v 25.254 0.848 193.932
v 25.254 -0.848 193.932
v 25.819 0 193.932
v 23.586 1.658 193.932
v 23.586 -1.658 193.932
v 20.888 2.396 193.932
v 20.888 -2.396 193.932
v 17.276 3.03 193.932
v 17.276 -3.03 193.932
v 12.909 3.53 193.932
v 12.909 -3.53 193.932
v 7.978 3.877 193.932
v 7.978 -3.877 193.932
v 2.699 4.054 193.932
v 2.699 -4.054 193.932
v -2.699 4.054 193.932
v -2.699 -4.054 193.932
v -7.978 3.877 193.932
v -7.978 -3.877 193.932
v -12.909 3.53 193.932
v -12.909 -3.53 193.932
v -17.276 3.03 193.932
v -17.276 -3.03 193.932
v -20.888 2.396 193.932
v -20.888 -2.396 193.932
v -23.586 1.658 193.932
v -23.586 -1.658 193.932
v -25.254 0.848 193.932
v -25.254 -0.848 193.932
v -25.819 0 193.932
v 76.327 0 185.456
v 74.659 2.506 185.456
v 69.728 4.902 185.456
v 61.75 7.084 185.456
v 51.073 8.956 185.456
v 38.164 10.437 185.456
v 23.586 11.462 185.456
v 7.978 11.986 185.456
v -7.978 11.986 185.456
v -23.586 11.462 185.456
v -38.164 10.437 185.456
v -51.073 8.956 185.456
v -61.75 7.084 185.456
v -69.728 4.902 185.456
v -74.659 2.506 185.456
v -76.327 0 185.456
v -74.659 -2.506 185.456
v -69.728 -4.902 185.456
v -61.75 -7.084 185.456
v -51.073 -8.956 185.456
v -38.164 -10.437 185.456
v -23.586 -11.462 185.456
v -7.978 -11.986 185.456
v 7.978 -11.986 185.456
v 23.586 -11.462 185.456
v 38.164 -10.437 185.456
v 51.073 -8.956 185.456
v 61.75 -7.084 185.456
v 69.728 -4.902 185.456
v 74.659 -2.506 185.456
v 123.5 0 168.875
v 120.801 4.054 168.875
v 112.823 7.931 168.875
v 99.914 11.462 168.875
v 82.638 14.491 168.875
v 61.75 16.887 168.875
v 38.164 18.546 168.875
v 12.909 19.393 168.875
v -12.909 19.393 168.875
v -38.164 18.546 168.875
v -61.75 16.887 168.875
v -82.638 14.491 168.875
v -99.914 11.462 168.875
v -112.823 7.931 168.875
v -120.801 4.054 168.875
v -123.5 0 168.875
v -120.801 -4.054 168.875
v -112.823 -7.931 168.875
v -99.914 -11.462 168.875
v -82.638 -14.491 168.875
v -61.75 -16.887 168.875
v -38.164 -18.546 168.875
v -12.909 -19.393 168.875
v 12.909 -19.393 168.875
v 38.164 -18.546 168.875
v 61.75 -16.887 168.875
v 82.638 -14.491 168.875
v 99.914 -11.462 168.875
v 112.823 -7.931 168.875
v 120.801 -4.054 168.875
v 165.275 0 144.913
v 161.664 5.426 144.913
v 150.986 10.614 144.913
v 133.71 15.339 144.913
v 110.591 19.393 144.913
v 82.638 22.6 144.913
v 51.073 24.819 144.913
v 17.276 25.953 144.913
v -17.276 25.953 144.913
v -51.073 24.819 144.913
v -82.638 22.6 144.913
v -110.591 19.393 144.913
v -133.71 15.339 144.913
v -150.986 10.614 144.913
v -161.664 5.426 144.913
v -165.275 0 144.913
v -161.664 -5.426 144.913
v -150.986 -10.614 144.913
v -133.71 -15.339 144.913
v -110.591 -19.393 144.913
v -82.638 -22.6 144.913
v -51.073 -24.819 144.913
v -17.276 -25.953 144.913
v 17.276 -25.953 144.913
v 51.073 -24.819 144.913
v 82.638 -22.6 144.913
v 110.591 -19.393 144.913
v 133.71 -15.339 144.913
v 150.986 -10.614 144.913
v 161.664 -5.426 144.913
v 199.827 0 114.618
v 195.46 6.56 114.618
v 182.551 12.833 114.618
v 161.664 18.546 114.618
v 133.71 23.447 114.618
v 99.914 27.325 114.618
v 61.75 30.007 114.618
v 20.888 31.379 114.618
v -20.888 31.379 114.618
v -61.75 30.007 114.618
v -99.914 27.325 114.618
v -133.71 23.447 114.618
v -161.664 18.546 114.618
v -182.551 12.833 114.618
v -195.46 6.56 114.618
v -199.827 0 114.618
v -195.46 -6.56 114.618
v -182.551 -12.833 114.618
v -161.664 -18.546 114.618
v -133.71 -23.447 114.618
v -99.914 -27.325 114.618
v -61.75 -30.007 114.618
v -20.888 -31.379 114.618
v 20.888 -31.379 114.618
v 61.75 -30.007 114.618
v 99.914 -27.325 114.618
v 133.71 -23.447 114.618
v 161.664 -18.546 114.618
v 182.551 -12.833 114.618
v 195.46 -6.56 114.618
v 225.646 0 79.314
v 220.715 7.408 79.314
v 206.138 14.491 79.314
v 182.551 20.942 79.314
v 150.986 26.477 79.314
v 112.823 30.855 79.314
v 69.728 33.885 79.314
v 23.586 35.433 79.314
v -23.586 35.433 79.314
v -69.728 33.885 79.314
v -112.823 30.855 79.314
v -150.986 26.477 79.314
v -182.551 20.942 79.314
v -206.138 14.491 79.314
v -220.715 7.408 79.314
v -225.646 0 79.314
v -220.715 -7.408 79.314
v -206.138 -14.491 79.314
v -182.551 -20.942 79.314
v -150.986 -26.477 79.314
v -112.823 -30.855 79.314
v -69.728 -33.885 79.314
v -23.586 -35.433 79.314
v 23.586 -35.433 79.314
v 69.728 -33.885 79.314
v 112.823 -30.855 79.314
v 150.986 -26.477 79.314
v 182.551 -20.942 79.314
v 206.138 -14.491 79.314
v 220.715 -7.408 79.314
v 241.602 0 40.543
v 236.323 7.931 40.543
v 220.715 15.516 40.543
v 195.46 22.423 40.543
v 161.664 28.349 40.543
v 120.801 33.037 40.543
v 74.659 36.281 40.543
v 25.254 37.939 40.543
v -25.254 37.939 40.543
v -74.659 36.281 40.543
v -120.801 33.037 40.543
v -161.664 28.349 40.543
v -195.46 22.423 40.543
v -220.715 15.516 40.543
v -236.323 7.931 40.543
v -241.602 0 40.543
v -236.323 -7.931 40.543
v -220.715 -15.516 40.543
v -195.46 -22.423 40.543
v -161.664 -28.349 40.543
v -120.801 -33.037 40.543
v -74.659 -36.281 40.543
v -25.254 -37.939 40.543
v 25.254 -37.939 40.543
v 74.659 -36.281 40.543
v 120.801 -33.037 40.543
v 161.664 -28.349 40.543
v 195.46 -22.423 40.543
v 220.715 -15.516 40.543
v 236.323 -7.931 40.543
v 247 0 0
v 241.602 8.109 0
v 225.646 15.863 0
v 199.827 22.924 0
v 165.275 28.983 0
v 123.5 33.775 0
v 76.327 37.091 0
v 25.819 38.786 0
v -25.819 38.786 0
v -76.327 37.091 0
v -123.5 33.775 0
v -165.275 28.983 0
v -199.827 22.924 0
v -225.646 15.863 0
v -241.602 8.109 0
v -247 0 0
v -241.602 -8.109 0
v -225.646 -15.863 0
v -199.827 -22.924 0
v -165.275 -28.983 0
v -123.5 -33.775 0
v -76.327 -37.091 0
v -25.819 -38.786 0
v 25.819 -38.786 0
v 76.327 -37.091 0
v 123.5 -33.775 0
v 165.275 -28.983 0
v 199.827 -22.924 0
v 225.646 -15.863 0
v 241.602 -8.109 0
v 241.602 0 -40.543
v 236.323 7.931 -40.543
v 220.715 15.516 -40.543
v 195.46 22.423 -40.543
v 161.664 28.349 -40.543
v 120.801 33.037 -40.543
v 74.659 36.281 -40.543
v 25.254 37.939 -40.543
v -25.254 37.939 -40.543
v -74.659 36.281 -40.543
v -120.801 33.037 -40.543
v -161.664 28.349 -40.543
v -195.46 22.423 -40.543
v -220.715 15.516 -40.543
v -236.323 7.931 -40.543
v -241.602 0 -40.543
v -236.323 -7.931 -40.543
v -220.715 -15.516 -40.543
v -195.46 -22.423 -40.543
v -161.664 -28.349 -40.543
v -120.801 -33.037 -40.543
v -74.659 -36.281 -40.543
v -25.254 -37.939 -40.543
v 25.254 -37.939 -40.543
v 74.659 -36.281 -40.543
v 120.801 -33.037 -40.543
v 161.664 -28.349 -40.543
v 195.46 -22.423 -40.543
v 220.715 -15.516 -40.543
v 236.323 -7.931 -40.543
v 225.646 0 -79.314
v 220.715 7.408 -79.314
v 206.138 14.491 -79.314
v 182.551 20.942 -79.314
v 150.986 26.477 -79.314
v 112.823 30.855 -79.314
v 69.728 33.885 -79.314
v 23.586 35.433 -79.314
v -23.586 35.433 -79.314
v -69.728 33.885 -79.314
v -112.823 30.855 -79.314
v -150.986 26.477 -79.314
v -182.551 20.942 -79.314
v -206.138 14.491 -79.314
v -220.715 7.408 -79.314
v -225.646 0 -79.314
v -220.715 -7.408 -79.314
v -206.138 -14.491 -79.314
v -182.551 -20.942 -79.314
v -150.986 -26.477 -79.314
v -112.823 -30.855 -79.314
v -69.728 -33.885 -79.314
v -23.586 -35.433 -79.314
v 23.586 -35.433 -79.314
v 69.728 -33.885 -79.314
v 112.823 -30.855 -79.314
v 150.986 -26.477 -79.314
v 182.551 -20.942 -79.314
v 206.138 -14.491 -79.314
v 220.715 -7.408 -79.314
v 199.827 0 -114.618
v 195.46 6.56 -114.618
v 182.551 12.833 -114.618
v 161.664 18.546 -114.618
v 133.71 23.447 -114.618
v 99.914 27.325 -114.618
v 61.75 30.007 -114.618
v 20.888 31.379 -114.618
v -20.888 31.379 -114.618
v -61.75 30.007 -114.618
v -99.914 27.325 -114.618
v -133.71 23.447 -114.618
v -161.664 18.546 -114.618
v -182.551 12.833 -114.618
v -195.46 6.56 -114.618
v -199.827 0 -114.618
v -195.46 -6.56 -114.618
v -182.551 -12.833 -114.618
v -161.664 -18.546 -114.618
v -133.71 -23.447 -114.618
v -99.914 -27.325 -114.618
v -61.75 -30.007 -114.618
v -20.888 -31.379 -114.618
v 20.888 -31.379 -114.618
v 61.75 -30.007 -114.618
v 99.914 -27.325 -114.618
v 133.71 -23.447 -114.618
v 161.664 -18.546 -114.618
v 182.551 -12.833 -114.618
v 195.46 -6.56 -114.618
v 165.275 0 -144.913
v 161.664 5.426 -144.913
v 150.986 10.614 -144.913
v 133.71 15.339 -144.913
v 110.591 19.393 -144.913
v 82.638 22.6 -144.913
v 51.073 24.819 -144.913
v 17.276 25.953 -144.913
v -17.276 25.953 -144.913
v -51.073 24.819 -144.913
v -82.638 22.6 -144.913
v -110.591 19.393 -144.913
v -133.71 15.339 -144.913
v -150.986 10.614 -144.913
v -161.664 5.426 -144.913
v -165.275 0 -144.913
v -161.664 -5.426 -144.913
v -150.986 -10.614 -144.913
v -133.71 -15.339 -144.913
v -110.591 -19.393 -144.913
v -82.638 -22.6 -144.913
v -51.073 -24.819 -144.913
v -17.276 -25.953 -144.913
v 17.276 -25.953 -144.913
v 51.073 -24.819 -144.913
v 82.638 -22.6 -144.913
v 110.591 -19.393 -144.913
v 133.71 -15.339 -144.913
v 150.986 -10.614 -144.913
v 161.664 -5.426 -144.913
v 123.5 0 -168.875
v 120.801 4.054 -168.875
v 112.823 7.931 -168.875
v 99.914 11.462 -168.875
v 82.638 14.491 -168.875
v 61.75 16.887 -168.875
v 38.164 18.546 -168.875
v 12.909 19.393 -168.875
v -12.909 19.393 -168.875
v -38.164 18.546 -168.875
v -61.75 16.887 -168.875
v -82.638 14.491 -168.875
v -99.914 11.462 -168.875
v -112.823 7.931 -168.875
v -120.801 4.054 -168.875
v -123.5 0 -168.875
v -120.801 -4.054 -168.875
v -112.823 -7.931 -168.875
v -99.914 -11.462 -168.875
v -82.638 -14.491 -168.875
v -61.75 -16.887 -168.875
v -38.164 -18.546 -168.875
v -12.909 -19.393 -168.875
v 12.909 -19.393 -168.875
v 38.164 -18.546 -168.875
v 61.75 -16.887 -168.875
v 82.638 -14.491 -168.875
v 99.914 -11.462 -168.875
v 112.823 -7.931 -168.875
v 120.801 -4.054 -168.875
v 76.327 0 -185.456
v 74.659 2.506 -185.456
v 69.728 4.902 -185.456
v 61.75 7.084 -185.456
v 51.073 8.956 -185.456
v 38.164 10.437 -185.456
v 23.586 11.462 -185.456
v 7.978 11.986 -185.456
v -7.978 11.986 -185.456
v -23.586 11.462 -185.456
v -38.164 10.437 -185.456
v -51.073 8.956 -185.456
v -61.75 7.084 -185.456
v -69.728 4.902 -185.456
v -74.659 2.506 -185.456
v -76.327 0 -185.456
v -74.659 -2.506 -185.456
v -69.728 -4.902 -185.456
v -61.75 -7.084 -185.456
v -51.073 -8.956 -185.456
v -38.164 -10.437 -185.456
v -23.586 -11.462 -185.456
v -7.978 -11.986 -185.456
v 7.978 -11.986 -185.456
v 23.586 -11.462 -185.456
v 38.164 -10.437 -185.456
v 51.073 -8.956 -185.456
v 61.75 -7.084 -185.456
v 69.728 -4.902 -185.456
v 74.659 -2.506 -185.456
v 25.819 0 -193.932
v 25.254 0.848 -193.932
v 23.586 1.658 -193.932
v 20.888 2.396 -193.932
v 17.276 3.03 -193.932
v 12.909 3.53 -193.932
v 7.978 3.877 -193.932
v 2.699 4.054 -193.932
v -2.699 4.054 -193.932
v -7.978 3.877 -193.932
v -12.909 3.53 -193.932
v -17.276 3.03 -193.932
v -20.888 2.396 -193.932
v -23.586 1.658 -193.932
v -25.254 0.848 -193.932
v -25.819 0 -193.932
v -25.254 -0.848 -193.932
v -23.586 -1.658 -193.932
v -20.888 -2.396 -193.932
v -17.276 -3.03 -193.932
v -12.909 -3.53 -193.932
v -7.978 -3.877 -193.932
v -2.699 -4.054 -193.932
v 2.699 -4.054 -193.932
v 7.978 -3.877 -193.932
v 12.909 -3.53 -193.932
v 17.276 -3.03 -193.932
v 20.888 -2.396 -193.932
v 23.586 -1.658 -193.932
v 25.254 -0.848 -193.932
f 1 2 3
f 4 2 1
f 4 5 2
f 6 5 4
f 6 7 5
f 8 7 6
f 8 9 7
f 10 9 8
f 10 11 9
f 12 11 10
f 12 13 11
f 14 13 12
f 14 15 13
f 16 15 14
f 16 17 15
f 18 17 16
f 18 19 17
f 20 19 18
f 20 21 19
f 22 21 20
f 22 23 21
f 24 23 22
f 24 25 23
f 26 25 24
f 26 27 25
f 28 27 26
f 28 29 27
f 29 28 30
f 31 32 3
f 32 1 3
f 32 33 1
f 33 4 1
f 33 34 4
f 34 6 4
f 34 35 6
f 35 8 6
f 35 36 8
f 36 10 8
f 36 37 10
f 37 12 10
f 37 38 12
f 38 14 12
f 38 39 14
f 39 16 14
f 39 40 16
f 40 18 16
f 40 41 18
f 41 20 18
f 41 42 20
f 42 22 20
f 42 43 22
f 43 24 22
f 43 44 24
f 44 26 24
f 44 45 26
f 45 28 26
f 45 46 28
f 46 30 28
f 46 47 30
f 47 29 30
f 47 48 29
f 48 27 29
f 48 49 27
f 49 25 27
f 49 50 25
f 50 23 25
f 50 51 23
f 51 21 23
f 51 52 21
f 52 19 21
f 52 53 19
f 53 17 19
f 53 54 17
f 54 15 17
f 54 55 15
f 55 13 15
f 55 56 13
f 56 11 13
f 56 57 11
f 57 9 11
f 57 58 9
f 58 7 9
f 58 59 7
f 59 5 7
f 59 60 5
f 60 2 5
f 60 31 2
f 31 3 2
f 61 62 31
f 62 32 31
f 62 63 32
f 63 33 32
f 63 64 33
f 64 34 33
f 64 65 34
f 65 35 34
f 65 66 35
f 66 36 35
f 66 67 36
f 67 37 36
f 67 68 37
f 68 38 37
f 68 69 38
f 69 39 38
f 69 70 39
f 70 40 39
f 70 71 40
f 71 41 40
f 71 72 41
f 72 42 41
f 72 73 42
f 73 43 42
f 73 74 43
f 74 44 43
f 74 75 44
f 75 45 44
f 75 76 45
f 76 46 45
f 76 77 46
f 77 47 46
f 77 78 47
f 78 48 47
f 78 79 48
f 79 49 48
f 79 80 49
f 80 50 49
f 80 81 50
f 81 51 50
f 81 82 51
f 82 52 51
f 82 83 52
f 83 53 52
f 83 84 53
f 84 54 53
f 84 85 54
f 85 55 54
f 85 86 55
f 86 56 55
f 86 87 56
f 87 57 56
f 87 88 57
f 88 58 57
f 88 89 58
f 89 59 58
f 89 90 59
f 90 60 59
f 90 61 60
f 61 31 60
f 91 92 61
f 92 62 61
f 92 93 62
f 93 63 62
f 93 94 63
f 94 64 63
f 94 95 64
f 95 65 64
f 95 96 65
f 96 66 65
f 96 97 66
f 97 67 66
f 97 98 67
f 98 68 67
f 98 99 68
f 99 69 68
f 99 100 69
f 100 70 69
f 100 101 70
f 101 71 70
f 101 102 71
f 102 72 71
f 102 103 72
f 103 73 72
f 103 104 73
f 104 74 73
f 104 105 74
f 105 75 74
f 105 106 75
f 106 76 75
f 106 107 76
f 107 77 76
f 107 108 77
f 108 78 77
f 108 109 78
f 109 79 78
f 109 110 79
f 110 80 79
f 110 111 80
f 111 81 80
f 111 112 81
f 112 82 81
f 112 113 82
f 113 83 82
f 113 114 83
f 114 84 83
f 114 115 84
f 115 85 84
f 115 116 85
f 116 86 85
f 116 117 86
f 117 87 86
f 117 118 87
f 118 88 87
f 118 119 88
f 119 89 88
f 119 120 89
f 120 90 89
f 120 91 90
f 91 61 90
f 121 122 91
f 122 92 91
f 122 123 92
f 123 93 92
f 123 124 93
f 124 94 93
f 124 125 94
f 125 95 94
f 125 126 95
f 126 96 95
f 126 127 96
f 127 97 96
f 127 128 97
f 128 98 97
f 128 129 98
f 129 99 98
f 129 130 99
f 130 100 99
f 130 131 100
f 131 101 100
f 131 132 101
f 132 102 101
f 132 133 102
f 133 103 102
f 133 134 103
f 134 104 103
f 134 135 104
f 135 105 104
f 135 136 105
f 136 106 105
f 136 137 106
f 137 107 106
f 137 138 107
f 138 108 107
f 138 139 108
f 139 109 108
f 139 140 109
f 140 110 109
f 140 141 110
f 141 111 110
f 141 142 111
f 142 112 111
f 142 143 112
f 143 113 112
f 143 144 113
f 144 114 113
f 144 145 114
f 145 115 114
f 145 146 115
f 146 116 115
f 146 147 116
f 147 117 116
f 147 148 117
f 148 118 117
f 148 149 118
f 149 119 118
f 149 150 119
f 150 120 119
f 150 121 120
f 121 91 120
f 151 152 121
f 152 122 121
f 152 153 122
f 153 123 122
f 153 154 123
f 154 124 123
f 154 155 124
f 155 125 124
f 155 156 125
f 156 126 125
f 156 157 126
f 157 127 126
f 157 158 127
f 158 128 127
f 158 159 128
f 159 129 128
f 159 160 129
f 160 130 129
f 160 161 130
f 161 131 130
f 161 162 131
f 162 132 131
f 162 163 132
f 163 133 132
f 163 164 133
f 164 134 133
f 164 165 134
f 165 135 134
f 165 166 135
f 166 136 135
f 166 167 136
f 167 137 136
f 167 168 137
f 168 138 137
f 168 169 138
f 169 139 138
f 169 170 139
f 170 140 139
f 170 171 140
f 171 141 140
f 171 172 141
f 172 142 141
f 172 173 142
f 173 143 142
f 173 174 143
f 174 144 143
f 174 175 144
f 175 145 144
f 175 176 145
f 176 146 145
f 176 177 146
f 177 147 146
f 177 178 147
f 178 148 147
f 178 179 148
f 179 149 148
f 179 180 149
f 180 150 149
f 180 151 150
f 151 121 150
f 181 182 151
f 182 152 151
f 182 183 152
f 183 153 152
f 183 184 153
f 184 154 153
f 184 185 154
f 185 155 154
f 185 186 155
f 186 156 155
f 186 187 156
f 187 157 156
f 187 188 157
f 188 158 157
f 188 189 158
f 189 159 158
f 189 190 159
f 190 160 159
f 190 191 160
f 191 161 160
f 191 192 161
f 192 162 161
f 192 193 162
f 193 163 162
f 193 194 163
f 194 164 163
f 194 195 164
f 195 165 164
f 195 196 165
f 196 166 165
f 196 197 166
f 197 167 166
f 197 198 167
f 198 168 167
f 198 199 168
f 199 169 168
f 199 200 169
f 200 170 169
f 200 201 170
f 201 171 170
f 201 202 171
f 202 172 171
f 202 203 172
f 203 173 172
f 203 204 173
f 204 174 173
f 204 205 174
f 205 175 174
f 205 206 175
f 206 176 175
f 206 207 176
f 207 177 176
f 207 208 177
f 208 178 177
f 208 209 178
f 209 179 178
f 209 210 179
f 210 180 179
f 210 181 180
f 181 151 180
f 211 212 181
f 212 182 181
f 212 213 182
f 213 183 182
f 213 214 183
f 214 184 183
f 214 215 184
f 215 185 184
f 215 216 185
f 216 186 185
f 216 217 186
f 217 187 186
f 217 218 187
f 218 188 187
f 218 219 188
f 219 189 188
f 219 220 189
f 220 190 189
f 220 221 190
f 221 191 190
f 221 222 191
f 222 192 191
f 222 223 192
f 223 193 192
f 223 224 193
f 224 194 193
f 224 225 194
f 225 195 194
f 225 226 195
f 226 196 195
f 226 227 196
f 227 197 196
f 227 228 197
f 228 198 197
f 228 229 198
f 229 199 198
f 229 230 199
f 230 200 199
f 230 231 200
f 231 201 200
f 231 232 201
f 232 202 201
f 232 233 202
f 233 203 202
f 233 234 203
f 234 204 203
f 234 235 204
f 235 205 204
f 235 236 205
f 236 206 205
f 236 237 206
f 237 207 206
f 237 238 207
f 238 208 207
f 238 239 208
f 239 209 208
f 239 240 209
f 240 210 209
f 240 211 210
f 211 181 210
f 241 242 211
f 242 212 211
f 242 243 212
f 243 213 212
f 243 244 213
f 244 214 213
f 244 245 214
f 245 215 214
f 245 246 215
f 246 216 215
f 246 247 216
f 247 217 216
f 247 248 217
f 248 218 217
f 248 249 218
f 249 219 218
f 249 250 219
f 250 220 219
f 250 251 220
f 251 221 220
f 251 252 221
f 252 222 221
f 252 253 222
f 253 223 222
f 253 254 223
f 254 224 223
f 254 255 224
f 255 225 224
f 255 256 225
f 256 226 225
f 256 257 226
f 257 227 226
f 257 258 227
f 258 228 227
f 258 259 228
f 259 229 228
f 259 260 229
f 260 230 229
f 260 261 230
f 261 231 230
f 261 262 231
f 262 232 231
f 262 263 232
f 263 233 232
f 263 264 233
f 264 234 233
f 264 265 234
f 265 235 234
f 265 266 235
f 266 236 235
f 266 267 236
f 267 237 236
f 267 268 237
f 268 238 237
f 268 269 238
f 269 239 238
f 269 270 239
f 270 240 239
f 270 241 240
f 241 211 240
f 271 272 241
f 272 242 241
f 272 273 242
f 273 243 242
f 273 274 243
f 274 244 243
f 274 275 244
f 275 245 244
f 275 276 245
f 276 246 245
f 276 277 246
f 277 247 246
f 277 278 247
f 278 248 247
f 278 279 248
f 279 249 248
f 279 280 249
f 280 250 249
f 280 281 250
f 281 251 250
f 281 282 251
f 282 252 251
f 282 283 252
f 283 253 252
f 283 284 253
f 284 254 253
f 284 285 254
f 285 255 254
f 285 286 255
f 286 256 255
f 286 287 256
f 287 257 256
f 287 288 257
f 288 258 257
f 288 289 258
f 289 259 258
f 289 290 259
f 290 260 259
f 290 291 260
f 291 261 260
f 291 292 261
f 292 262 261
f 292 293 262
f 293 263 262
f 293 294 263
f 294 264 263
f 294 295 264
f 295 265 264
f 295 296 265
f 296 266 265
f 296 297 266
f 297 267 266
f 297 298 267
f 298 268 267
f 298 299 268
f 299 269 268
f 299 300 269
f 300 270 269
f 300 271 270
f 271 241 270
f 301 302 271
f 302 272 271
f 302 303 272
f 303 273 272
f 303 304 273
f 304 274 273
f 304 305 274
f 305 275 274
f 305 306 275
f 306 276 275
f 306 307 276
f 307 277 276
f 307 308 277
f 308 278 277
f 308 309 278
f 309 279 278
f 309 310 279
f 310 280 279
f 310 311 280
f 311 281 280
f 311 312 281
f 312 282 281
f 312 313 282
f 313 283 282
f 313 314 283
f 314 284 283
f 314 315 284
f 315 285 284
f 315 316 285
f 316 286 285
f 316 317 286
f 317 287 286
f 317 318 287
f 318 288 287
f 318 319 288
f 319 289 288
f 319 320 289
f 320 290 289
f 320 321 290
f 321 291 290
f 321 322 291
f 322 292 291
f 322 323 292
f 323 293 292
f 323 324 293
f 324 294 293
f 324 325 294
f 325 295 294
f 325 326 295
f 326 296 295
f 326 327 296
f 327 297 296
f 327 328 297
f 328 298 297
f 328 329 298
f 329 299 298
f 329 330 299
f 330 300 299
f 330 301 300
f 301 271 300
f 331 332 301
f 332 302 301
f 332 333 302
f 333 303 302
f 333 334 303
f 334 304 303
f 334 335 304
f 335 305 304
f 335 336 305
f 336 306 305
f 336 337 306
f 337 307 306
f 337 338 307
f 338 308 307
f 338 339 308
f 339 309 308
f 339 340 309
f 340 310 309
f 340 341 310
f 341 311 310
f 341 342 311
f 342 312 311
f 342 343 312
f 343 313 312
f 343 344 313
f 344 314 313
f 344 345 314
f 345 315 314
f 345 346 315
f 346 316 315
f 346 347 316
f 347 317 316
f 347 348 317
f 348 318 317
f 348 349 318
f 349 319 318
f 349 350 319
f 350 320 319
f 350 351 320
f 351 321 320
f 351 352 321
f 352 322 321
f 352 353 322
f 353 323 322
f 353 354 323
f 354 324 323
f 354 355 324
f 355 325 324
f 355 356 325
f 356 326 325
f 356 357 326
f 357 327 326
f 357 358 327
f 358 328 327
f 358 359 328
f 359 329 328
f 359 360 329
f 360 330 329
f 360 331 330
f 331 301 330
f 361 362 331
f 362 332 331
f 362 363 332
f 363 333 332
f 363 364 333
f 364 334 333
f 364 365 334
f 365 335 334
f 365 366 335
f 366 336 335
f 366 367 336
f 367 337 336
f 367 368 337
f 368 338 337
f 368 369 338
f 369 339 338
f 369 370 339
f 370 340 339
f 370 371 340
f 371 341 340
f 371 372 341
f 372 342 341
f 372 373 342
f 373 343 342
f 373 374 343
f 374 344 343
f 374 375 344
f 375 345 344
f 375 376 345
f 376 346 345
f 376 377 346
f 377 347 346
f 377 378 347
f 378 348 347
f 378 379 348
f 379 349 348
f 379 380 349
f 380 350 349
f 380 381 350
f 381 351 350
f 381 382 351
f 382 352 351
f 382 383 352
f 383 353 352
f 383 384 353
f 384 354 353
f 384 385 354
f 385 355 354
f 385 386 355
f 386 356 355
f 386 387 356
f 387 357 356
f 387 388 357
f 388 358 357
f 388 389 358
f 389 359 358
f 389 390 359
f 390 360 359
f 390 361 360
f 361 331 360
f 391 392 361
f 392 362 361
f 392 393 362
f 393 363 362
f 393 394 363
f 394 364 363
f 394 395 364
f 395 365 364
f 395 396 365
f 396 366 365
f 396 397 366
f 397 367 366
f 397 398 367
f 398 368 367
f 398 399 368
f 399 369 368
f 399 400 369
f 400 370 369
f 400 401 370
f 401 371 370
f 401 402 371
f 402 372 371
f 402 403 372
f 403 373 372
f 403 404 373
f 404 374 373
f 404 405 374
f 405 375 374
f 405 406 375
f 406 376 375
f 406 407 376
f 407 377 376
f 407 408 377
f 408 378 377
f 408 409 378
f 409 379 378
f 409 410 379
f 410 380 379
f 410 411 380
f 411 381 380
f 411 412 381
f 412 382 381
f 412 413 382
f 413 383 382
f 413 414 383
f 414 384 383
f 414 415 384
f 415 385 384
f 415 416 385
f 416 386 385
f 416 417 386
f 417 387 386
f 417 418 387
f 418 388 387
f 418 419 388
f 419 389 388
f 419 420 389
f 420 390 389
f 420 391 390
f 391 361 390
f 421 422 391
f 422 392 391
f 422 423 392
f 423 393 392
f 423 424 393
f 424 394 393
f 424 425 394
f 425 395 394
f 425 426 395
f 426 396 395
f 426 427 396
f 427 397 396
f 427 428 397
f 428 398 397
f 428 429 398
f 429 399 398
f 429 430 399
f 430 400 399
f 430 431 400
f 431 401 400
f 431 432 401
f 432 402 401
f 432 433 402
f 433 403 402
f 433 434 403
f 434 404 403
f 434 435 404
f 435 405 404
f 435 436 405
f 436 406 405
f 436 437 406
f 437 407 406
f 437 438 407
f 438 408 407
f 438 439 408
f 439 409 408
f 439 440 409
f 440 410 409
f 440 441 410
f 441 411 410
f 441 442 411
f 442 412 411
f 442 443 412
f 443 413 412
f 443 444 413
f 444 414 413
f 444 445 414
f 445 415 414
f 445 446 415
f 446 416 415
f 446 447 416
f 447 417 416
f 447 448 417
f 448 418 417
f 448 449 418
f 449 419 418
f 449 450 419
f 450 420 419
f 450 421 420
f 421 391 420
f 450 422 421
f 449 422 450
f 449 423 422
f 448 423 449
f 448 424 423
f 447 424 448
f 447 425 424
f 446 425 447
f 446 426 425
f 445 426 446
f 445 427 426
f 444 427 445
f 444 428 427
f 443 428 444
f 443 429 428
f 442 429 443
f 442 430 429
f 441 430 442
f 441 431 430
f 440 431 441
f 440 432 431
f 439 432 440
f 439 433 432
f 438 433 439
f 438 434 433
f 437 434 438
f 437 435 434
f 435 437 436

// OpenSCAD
// Generated by SolidPython 1.0.1 on 2020-07-29 00:46:53


scale(v = [19, 3, 15]) {
	sphere(r = 13);
}
/***********************************************
*********      SolidPython code:      **********
************************************************
 
# import packages: SolidPython
from solid import *
from solid.utils import *
from itertools import chain, combinations, permutations


class Resize:

    def __init__(self, scad_file):
        self.scad_file = scad_file
        #self.scad_file = import_scad(scad_file)
        # cone/cylinder param:
        self.r1 = 0
        self.r2 = 0
        self.h = 0
        # rectangular prism param:
        self.w = 0
        self.l = 0
        # ellipse param:
        self.r = 0

    # import OpenScad code (file name corresponds to shape)


    # classify shape + parameters
    def assign(self, param1, param2, param3):
        if self.scad_file == 'cone.scad':
            self.r1 = param1
            self.r2 = param2
            self.h = param3
        elif self.scad_file == 'cylinder.scad':
            self.r1 = param1
            self.r2 = param2
            self.h = param3
        elif self.scad_file == 'rectangularPrism.scad':
            self.h = param1
            self.l = param2
            self.w = param3
        else:
            self.r = param1
            self.h = param2

    # resize parameters
    def iterate(self):
        x = range(3, 20, 2)
        i = 1
        if self.scad_file == 'cone.scad':
            tempList = list(permutations(x, 2))
            for temp in tempList:
                param1 = temp[0]
                param2 = temp[1]
                filepath = 'produced_scad_files/' + 'cone' + str(param1) + '_' + str(param2) + '_' + '.scad'
                scad_render_to_file(cylinder(h=param1, r1=param2, r2=0), filepath)

        elif self.scad_file == 'cylinder.scad':
            tempList = list(permutations(x, 3))
            for temp in tempList:
                param1 = temp[0]
                param2 = temp[1]
                filepath = 'produced_scad_files/' + 'cylinder' + str(param1) + '_' + str(param2) + '_' + '.scad'
                scad_render_to_file(cylinder(h=param1, r1=param2, r2=param2), filepath)

        elif self.scad_file == 'rectangularPrism.scad':
            tempList = list(permutations(x, 3))
            for temp in tempList:
                param1 = temp[0]
                param2 = temp[1]
                param3 = temp[2]
                filepath = 'produced_scad_files/' + 'rectangularPrism' + str(param1) + '_' + str(param2) + '_' + str(
                    param3) + '.scad'
                scad_render_to_file(cube(size=(param1, param2, param3)), filepath)

        elif self.scad_file == 'ellipse.scad':
            tempList = list(permutations(x, 4))
            for temp in tempList:
                param1 = temp[0]
                param2 = temp[1]
                param3 = temp[2]
                param4 = temp[3]
                filepath = 'produced_scad_files/' + 'ellipse' + str(param1) + '_' + str(param2) + '_' + str(param3) + '_' + str(param4) + '.scad'
                scad_render_to_file(scale([param1, param2, param3])(sphere(r=param4)), filepath)

    def render_to_scadfile(self):
        scad_render_to_file(scad, 'example.scad') 
 
************************************************/
